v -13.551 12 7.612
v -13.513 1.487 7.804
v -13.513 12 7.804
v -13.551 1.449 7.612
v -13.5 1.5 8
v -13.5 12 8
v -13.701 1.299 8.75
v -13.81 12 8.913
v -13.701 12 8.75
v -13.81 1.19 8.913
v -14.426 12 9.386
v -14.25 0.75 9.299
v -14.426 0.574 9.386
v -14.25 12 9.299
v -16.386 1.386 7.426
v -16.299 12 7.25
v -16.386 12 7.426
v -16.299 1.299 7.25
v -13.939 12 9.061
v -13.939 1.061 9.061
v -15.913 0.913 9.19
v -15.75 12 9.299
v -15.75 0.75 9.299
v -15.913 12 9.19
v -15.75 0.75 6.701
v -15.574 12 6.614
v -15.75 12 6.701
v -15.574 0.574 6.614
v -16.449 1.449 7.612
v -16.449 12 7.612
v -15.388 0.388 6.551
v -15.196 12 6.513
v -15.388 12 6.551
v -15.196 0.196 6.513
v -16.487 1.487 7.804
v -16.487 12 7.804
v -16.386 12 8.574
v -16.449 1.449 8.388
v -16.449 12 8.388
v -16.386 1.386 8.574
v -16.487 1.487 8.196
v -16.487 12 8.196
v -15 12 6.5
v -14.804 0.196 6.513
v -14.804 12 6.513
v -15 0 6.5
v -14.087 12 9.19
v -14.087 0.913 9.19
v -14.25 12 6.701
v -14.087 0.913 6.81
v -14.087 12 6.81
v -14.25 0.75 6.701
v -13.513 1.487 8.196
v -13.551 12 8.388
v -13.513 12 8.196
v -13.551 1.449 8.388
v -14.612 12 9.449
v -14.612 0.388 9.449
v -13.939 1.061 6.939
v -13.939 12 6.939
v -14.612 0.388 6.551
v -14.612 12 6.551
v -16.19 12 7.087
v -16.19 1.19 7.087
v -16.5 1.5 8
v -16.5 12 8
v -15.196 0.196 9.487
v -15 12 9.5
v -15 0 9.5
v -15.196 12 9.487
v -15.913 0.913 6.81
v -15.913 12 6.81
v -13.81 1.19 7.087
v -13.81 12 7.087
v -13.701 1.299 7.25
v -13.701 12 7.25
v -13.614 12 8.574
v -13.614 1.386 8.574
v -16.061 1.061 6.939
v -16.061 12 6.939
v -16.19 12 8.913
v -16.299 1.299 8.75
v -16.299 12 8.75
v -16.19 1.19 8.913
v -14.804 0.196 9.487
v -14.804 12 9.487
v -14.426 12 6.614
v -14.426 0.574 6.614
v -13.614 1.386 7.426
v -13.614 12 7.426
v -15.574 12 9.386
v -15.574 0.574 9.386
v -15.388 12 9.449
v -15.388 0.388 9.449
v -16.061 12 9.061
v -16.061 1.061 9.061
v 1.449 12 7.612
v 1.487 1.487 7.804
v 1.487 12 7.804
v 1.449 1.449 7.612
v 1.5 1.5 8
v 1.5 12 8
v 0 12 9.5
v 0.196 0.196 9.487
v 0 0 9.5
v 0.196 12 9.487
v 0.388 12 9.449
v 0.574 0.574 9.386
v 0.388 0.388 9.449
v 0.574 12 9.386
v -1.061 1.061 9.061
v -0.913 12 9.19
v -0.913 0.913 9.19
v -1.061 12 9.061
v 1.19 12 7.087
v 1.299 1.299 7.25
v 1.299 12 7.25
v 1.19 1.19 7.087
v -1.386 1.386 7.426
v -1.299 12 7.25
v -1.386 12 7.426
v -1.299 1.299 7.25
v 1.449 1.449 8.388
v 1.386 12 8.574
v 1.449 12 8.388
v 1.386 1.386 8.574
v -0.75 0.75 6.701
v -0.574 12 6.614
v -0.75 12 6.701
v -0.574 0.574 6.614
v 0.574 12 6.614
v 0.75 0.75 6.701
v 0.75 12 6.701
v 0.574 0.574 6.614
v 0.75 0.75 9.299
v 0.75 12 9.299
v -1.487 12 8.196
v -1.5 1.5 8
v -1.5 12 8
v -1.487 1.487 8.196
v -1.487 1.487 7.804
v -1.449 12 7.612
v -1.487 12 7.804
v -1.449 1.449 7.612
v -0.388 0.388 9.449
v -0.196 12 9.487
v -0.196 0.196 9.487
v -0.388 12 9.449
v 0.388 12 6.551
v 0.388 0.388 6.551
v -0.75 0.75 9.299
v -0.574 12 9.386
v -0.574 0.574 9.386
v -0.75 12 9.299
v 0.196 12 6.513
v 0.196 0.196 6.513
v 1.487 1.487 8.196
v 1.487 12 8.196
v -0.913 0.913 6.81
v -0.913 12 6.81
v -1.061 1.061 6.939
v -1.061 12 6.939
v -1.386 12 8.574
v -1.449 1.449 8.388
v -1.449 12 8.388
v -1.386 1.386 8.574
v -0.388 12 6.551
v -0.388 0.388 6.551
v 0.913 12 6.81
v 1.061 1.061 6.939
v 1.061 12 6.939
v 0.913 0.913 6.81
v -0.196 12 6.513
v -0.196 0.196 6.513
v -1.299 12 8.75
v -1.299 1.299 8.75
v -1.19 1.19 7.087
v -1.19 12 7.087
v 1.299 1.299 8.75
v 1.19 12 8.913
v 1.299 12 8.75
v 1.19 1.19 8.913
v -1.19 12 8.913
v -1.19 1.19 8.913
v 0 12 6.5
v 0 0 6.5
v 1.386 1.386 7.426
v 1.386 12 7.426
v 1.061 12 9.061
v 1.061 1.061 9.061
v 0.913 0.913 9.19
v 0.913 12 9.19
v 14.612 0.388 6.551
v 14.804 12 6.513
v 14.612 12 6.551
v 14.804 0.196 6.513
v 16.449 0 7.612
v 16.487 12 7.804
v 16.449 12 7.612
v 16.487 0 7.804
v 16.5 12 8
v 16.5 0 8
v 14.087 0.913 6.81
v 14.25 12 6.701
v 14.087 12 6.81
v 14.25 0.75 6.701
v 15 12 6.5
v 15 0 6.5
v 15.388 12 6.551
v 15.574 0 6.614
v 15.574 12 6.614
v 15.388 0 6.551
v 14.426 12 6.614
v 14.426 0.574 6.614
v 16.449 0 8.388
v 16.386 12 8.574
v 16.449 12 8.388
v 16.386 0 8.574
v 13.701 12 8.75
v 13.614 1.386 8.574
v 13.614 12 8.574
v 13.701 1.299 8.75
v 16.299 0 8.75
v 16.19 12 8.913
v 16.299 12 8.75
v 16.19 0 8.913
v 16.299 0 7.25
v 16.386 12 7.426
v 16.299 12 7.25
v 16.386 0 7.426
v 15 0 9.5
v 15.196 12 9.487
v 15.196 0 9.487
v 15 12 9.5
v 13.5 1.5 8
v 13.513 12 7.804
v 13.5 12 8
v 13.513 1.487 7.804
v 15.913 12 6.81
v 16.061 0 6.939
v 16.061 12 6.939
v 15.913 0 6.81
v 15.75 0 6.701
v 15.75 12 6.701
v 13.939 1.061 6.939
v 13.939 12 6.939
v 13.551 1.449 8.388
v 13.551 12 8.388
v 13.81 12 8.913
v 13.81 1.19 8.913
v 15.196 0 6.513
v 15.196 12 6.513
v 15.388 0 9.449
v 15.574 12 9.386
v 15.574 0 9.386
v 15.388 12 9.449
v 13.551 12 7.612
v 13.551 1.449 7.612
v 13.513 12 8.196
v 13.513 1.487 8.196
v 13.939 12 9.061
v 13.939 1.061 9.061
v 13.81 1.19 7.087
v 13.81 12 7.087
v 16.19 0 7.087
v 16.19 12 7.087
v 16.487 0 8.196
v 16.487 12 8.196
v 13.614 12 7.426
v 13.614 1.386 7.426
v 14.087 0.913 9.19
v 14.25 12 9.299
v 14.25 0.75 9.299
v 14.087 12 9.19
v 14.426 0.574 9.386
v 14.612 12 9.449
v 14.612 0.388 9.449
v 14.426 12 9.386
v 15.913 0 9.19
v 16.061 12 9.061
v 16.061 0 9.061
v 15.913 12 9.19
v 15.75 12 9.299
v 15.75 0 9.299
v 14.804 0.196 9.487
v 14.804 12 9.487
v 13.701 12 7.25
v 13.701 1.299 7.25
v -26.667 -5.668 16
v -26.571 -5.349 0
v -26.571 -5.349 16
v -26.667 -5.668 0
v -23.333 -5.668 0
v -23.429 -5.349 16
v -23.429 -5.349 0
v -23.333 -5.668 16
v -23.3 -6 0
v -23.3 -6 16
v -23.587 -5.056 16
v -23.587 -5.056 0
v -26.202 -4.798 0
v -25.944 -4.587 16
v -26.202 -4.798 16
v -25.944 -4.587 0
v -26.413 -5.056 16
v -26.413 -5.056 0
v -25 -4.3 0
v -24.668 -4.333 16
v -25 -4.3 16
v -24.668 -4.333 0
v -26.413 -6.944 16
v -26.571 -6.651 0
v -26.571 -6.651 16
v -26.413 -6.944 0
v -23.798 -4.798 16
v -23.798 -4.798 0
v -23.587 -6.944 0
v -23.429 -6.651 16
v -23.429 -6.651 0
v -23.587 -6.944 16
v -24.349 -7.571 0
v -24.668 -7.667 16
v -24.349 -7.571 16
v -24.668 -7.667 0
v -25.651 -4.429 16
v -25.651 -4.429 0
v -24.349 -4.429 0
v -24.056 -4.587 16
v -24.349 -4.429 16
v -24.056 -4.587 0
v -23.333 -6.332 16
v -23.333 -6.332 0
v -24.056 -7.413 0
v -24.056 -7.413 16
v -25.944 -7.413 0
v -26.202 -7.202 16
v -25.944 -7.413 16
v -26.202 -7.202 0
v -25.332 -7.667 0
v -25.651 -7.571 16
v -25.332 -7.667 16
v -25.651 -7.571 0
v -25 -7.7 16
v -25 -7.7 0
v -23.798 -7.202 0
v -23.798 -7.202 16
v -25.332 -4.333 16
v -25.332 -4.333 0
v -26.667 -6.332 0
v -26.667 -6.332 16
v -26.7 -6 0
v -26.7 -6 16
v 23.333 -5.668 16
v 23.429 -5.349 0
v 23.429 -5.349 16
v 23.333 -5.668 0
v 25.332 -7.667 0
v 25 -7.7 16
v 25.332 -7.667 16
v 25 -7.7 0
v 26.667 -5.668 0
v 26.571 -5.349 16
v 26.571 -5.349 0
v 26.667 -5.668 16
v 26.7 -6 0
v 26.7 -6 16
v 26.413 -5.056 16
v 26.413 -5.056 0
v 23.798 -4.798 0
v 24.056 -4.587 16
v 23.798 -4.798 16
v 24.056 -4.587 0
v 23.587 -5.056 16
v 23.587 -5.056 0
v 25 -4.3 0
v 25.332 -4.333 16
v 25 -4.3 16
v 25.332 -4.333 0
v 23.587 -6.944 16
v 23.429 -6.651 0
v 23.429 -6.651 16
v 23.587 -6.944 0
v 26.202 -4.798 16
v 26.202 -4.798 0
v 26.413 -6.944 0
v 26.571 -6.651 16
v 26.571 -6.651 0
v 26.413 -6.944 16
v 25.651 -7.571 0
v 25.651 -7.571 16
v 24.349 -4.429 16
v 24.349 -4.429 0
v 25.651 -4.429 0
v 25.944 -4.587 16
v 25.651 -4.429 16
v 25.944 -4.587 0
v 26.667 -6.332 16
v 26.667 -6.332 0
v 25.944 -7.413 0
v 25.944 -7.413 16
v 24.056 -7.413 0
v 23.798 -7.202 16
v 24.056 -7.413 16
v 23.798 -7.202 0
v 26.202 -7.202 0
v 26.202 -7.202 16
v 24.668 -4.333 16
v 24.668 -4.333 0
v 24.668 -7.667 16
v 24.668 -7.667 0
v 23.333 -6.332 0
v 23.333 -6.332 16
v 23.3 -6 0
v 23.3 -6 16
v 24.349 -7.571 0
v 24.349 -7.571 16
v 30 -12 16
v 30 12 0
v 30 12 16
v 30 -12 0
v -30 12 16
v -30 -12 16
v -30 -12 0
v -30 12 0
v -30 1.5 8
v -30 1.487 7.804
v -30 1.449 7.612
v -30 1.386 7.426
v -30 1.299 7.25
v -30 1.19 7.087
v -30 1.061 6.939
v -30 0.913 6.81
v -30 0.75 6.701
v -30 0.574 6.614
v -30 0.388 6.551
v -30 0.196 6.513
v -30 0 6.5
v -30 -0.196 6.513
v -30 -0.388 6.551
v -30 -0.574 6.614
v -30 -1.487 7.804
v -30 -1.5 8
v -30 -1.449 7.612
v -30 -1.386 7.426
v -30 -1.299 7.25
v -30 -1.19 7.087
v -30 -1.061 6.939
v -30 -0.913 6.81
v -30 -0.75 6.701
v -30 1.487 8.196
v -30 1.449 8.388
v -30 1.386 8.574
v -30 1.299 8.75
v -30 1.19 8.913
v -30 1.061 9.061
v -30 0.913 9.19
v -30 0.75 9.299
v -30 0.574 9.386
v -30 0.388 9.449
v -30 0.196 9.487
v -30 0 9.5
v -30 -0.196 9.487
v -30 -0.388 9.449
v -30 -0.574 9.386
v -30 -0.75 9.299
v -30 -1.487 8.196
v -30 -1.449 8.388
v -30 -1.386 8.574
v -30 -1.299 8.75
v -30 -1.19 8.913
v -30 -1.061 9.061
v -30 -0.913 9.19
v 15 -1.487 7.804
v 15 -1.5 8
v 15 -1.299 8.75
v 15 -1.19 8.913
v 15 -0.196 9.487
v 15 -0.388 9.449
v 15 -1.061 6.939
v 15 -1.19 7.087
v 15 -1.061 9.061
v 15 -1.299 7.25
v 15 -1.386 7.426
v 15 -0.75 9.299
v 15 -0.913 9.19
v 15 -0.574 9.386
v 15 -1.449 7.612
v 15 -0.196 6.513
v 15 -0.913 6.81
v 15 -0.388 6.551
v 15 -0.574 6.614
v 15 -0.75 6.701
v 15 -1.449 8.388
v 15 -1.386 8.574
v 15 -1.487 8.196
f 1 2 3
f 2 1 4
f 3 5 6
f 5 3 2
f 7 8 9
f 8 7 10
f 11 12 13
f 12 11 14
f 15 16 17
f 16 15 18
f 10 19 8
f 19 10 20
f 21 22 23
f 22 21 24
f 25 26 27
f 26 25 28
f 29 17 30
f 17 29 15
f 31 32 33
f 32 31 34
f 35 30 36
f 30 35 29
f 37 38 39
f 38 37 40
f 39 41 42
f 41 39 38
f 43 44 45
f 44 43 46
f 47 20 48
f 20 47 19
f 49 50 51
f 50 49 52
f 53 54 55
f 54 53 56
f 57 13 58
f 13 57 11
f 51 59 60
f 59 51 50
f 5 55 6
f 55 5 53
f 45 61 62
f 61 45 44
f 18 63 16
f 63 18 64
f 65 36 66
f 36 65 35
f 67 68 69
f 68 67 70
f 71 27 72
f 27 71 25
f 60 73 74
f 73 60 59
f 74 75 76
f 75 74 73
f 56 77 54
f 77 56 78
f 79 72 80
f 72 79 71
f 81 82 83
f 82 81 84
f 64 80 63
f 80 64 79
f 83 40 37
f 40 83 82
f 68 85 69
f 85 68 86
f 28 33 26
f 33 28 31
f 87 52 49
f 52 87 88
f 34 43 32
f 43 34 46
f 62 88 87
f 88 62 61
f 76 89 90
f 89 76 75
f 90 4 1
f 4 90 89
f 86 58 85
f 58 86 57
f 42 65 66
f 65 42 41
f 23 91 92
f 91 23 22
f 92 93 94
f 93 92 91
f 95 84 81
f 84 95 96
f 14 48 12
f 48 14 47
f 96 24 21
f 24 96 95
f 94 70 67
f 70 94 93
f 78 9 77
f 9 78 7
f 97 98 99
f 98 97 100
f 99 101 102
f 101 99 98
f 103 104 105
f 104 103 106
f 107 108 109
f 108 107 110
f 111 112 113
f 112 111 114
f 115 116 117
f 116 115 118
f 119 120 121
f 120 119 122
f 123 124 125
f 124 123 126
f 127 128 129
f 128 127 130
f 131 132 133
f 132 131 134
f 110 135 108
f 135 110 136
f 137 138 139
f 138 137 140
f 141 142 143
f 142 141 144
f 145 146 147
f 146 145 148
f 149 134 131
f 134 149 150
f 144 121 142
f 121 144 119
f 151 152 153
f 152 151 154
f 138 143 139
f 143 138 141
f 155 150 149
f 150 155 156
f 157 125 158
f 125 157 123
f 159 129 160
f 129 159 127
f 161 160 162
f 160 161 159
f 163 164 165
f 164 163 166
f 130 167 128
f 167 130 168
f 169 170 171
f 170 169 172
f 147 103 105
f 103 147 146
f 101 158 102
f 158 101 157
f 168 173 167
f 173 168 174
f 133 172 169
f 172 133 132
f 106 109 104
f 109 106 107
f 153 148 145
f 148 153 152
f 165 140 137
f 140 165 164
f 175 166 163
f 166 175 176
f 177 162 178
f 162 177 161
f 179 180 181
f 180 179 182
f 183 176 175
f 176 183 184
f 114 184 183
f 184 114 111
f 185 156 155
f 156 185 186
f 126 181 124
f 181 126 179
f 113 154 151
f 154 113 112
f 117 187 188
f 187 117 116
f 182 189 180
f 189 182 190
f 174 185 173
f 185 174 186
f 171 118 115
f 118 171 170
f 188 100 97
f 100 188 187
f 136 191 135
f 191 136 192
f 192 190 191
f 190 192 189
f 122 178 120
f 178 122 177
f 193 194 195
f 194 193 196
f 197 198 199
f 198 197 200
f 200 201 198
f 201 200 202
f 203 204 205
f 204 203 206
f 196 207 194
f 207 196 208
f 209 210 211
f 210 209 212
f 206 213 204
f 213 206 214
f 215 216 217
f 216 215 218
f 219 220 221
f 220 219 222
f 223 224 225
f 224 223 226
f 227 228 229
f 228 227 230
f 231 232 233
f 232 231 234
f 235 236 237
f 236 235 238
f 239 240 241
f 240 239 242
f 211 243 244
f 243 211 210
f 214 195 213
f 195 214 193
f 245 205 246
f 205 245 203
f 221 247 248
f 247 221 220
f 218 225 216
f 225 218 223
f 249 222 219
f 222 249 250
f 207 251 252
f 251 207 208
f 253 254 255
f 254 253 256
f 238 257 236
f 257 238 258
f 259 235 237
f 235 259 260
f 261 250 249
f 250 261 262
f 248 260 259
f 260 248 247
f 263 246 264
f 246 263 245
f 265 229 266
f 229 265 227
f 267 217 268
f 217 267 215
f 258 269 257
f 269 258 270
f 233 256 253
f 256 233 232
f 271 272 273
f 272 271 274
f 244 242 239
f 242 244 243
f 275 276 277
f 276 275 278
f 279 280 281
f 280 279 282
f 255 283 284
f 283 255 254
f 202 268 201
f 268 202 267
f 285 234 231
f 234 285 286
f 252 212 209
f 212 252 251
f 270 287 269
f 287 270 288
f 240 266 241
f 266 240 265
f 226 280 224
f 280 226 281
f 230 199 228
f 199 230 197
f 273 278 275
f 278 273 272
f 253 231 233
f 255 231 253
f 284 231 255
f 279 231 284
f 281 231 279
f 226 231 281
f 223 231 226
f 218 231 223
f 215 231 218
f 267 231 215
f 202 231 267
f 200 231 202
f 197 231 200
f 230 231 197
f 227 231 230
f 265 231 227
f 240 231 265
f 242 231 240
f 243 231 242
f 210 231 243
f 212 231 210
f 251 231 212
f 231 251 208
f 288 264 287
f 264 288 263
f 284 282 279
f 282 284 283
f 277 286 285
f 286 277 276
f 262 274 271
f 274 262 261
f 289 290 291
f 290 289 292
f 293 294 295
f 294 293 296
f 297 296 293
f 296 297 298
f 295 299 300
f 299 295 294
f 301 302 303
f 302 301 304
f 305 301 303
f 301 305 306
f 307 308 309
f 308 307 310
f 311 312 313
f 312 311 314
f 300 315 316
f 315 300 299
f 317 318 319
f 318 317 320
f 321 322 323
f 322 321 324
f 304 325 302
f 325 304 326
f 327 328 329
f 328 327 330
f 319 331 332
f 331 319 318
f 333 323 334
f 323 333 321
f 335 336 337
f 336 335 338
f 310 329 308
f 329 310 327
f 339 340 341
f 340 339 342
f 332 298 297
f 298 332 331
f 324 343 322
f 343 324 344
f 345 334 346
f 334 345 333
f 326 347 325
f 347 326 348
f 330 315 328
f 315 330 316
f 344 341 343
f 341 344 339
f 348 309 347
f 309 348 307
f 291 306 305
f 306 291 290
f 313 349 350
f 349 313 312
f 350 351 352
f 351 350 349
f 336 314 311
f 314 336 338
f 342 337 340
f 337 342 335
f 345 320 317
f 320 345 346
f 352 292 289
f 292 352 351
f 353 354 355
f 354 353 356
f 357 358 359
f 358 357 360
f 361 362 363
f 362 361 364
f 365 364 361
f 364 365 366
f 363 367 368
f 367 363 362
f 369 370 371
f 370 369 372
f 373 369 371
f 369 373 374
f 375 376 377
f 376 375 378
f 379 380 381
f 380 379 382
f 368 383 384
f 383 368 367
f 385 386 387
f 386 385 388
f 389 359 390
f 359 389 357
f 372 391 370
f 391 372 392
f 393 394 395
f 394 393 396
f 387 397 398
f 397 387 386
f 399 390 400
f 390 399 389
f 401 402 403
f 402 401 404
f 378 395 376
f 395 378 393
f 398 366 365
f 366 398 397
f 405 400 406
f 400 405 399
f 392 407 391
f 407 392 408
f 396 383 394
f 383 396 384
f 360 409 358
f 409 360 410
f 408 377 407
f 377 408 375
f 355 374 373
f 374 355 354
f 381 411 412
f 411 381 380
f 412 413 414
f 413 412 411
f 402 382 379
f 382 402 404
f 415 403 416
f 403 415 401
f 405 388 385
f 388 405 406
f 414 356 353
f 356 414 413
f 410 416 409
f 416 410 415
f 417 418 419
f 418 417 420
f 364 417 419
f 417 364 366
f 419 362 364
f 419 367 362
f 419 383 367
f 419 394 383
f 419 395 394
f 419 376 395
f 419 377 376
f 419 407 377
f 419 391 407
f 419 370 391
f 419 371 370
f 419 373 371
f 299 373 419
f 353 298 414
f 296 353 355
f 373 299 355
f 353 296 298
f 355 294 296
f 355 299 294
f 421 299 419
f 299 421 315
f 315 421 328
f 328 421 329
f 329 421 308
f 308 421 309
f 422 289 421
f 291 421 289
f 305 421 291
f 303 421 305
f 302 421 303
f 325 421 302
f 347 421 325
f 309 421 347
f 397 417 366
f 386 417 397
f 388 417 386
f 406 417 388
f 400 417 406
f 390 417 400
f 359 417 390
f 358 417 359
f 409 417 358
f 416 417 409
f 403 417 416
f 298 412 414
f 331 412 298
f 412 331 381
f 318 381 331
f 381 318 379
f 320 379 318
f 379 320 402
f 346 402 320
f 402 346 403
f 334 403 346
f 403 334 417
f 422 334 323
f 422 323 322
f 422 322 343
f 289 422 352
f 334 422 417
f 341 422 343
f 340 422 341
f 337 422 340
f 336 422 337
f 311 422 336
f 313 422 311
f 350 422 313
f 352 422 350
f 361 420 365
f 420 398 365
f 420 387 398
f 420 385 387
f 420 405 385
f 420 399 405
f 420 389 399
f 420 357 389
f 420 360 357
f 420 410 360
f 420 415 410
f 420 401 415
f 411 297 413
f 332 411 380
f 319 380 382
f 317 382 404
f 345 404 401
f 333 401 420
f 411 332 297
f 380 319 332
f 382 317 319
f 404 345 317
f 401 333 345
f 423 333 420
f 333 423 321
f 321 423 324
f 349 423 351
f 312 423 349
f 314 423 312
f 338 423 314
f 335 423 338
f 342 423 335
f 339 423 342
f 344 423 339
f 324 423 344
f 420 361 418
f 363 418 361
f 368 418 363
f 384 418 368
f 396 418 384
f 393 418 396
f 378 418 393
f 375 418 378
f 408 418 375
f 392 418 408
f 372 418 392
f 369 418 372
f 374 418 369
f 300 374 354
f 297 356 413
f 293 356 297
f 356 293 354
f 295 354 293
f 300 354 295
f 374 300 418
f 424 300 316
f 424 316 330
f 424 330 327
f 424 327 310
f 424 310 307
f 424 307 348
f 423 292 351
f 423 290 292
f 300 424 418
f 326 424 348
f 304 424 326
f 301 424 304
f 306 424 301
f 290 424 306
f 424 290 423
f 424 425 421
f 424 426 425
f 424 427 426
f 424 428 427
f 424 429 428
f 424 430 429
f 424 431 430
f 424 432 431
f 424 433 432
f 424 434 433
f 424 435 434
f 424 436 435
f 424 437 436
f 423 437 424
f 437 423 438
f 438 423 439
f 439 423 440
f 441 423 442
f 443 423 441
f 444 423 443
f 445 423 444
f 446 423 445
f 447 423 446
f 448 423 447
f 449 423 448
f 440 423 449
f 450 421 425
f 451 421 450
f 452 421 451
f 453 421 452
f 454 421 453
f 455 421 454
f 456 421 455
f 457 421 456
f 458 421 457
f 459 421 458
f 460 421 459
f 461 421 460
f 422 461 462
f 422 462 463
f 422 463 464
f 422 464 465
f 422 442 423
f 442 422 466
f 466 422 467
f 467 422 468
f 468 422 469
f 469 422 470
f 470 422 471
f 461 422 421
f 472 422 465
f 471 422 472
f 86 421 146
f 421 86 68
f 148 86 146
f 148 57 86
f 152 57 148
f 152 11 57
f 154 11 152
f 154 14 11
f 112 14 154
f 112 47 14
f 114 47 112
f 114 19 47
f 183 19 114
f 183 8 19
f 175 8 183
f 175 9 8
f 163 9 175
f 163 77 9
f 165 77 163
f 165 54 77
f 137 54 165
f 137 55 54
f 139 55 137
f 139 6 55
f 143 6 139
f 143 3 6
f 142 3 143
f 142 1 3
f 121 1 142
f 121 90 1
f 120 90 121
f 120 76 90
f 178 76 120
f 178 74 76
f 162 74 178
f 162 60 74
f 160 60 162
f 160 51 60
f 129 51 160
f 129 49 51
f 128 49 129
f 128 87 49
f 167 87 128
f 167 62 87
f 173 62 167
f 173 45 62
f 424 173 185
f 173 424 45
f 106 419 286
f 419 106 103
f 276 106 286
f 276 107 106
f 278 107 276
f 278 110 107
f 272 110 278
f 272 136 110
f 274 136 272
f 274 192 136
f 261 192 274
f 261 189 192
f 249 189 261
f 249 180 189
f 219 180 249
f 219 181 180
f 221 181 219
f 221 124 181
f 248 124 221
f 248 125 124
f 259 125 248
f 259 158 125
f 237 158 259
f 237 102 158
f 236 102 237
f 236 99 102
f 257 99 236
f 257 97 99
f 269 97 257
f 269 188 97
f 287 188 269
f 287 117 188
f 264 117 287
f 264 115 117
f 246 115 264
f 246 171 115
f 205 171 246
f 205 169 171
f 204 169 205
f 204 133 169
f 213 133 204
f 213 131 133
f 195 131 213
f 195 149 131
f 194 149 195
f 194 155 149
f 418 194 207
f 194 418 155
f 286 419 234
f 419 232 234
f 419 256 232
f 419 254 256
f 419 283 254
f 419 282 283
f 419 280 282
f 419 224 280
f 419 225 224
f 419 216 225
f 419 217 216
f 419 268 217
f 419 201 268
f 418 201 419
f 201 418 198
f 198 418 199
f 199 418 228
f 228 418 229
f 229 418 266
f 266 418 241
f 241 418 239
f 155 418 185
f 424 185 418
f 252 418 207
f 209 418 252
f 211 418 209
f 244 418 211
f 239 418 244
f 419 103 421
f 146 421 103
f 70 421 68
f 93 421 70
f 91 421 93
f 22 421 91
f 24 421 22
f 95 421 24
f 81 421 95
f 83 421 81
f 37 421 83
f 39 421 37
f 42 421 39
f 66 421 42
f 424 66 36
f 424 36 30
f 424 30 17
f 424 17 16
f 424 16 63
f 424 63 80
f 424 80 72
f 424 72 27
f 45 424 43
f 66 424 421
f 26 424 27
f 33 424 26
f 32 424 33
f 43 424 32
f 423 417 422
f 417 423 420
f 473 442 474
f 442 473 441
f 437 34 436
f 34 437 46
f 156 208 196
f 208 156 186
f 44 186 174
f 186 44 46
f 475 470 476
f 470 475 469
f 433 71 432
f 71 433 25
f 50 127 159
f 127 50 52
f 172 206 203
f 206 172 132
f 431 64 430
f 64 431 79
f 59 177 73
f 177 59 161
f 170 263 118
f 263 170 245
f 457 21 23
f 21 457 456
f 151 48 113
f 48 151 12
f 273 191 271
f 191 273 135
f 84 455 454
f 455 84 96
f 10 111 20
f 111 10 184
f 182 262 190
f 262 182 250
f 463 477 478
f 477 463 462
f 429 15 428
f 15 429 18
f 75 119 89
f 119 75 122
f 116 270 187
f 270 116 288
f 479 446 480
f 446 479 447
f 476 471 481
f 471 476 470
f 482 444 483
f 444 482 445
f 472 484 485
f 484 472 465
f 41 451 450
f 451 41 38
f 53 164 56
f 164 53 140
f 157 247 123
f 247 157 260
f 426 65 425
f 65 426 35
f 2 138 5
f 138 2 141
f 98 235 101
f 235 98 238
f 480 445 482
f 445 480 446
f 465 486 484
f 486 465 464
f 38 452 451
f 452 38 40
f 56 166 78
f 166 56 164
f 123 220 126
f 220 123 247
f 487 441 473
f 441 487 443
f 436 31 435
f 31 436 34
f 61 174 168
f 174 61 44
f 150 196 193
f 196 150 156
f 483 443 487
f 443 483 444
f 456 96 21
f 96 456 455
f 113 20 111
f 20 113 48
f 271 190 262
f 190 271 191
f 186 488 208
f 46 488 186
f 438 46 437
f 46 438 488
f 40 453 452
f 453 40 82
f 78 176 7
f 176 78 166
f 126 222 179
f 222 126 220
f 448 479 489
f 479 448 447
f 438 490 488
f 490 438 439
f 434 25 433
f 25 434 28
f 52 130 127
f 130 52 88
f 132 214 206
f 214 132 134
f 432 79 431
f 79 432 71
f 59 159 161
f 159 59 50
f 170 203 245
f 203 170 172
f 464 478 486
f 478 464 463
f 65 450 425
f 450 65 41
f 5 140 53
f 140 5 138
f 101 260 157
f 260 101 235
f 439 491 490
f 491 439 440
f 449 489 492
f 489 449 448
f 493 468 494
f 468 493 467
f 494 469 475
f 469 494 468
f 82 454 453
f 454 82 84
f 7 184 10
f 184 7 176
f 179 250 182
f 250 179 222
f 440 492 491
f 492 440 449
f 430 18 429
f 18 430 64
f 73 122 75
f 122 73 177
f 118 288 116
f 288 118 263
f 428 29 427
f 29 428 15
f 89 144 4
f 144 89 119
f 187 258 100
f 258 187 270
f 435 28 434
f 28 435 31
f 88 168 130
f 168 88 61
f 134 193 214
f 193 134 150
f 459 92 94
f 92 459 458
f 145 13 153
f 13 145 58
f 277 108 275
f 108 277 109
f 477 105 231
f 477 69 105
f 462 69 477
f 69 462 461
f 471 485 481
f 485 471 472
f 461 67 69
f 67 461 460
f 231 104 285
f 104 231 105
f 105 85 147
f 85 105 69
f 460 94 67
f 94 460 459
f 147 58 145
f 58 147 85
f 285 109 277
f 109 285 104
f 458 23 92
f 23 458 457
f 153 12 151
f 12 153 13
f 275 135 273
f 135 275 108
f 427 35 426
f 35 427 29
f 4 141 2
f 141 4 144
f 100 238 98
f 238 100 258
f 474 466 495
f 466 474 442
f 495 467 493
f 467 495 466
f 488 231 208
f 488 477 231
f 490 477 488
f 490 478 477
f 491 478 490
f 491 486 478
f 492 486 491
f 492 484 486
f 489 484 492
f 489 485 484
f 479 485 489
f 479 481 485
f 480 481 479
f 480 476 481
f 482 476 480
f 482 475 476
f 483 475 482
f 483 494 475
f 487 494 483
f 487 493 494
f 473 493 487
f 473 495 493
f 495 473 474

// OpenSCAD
// KNOWN-WRONG PART (must fail): no 4.2 mm sockets: the 3 mm channels open straight onto the faces
// Manifold block: one tubing inlet split into three outlets through internal channels
// Category: hardware. 3 mm channels in the mid-plane: an inlet socket on the -X face feeds a main
// channel that ends inside the block; three branches run to sockets on the +Y face.
// Print: PETG, lying on its bottom face, 0.15 mm layers, 100 % infill (watertight walls);
// the 3 mm channels bridge cleanly. Leak-test before use; glue the tubing into the sockets.
// SPDX-License-Identifier: CERN-OHL-P-2.0

/* [Manifold] */
block = [60, 24, 16];     // X, Y, Z [mm], centred in X and Y
ch_z = 8;                 // channel mid-plane
ch_d = 3;
sock_d = 3;               // socket for 4 mm OD tubing
inlet_sock = 8;           // inlet socket depth (from the -X face)
outlet_sock = 6;          // outlet socket depth (from the +Y face)
main_end = 15;            // the main channel stops at x = 15
outlets_x = [-15, 0, 15];
screw_d = 3.4;            // M3 clearance
screws = [[-25, -6], [25, -6]];

/* [Hidden] */
eps = 0.01;

difference() {
    translate([-block.x / 2, -block.y / 2, 0]) cube(block);
    // inlet socket and main channel along +X
    translate([-block.x / 2 - 1, 0, ch_z]) rotate([0, 90, 0]) cylinder(d = sock_d, h = inlet_sock + 1, $fn = 48);
    translate([-block.x / 2 - 1, 0, ch_z]) rotate([0, 90, 0]) cylinder(d = ch_d, h = block.x / 2 + main_end + 1, $fn = 48);
    // outlet branches along +Y, each ending in a socket
    for (x = outlets_x) {
        translate([x, 0, ch_z]) rotate([-90, 0, 0]) cylinder(d = ch_d, h = block.y / 2 + 1, $fn = 48);
        translate([x, block.y / 2 - outlet_sock, ch_z]) rotate([-90, 0, 0]) cylinder(d = sock_d, h = outlet_sock + 1, $fn = 48);
    }
    for (p = screws) translate([p.x, p.y, -1]) cylinder(d = screw_d, h = block.z + 2, $fn = 32);
}
